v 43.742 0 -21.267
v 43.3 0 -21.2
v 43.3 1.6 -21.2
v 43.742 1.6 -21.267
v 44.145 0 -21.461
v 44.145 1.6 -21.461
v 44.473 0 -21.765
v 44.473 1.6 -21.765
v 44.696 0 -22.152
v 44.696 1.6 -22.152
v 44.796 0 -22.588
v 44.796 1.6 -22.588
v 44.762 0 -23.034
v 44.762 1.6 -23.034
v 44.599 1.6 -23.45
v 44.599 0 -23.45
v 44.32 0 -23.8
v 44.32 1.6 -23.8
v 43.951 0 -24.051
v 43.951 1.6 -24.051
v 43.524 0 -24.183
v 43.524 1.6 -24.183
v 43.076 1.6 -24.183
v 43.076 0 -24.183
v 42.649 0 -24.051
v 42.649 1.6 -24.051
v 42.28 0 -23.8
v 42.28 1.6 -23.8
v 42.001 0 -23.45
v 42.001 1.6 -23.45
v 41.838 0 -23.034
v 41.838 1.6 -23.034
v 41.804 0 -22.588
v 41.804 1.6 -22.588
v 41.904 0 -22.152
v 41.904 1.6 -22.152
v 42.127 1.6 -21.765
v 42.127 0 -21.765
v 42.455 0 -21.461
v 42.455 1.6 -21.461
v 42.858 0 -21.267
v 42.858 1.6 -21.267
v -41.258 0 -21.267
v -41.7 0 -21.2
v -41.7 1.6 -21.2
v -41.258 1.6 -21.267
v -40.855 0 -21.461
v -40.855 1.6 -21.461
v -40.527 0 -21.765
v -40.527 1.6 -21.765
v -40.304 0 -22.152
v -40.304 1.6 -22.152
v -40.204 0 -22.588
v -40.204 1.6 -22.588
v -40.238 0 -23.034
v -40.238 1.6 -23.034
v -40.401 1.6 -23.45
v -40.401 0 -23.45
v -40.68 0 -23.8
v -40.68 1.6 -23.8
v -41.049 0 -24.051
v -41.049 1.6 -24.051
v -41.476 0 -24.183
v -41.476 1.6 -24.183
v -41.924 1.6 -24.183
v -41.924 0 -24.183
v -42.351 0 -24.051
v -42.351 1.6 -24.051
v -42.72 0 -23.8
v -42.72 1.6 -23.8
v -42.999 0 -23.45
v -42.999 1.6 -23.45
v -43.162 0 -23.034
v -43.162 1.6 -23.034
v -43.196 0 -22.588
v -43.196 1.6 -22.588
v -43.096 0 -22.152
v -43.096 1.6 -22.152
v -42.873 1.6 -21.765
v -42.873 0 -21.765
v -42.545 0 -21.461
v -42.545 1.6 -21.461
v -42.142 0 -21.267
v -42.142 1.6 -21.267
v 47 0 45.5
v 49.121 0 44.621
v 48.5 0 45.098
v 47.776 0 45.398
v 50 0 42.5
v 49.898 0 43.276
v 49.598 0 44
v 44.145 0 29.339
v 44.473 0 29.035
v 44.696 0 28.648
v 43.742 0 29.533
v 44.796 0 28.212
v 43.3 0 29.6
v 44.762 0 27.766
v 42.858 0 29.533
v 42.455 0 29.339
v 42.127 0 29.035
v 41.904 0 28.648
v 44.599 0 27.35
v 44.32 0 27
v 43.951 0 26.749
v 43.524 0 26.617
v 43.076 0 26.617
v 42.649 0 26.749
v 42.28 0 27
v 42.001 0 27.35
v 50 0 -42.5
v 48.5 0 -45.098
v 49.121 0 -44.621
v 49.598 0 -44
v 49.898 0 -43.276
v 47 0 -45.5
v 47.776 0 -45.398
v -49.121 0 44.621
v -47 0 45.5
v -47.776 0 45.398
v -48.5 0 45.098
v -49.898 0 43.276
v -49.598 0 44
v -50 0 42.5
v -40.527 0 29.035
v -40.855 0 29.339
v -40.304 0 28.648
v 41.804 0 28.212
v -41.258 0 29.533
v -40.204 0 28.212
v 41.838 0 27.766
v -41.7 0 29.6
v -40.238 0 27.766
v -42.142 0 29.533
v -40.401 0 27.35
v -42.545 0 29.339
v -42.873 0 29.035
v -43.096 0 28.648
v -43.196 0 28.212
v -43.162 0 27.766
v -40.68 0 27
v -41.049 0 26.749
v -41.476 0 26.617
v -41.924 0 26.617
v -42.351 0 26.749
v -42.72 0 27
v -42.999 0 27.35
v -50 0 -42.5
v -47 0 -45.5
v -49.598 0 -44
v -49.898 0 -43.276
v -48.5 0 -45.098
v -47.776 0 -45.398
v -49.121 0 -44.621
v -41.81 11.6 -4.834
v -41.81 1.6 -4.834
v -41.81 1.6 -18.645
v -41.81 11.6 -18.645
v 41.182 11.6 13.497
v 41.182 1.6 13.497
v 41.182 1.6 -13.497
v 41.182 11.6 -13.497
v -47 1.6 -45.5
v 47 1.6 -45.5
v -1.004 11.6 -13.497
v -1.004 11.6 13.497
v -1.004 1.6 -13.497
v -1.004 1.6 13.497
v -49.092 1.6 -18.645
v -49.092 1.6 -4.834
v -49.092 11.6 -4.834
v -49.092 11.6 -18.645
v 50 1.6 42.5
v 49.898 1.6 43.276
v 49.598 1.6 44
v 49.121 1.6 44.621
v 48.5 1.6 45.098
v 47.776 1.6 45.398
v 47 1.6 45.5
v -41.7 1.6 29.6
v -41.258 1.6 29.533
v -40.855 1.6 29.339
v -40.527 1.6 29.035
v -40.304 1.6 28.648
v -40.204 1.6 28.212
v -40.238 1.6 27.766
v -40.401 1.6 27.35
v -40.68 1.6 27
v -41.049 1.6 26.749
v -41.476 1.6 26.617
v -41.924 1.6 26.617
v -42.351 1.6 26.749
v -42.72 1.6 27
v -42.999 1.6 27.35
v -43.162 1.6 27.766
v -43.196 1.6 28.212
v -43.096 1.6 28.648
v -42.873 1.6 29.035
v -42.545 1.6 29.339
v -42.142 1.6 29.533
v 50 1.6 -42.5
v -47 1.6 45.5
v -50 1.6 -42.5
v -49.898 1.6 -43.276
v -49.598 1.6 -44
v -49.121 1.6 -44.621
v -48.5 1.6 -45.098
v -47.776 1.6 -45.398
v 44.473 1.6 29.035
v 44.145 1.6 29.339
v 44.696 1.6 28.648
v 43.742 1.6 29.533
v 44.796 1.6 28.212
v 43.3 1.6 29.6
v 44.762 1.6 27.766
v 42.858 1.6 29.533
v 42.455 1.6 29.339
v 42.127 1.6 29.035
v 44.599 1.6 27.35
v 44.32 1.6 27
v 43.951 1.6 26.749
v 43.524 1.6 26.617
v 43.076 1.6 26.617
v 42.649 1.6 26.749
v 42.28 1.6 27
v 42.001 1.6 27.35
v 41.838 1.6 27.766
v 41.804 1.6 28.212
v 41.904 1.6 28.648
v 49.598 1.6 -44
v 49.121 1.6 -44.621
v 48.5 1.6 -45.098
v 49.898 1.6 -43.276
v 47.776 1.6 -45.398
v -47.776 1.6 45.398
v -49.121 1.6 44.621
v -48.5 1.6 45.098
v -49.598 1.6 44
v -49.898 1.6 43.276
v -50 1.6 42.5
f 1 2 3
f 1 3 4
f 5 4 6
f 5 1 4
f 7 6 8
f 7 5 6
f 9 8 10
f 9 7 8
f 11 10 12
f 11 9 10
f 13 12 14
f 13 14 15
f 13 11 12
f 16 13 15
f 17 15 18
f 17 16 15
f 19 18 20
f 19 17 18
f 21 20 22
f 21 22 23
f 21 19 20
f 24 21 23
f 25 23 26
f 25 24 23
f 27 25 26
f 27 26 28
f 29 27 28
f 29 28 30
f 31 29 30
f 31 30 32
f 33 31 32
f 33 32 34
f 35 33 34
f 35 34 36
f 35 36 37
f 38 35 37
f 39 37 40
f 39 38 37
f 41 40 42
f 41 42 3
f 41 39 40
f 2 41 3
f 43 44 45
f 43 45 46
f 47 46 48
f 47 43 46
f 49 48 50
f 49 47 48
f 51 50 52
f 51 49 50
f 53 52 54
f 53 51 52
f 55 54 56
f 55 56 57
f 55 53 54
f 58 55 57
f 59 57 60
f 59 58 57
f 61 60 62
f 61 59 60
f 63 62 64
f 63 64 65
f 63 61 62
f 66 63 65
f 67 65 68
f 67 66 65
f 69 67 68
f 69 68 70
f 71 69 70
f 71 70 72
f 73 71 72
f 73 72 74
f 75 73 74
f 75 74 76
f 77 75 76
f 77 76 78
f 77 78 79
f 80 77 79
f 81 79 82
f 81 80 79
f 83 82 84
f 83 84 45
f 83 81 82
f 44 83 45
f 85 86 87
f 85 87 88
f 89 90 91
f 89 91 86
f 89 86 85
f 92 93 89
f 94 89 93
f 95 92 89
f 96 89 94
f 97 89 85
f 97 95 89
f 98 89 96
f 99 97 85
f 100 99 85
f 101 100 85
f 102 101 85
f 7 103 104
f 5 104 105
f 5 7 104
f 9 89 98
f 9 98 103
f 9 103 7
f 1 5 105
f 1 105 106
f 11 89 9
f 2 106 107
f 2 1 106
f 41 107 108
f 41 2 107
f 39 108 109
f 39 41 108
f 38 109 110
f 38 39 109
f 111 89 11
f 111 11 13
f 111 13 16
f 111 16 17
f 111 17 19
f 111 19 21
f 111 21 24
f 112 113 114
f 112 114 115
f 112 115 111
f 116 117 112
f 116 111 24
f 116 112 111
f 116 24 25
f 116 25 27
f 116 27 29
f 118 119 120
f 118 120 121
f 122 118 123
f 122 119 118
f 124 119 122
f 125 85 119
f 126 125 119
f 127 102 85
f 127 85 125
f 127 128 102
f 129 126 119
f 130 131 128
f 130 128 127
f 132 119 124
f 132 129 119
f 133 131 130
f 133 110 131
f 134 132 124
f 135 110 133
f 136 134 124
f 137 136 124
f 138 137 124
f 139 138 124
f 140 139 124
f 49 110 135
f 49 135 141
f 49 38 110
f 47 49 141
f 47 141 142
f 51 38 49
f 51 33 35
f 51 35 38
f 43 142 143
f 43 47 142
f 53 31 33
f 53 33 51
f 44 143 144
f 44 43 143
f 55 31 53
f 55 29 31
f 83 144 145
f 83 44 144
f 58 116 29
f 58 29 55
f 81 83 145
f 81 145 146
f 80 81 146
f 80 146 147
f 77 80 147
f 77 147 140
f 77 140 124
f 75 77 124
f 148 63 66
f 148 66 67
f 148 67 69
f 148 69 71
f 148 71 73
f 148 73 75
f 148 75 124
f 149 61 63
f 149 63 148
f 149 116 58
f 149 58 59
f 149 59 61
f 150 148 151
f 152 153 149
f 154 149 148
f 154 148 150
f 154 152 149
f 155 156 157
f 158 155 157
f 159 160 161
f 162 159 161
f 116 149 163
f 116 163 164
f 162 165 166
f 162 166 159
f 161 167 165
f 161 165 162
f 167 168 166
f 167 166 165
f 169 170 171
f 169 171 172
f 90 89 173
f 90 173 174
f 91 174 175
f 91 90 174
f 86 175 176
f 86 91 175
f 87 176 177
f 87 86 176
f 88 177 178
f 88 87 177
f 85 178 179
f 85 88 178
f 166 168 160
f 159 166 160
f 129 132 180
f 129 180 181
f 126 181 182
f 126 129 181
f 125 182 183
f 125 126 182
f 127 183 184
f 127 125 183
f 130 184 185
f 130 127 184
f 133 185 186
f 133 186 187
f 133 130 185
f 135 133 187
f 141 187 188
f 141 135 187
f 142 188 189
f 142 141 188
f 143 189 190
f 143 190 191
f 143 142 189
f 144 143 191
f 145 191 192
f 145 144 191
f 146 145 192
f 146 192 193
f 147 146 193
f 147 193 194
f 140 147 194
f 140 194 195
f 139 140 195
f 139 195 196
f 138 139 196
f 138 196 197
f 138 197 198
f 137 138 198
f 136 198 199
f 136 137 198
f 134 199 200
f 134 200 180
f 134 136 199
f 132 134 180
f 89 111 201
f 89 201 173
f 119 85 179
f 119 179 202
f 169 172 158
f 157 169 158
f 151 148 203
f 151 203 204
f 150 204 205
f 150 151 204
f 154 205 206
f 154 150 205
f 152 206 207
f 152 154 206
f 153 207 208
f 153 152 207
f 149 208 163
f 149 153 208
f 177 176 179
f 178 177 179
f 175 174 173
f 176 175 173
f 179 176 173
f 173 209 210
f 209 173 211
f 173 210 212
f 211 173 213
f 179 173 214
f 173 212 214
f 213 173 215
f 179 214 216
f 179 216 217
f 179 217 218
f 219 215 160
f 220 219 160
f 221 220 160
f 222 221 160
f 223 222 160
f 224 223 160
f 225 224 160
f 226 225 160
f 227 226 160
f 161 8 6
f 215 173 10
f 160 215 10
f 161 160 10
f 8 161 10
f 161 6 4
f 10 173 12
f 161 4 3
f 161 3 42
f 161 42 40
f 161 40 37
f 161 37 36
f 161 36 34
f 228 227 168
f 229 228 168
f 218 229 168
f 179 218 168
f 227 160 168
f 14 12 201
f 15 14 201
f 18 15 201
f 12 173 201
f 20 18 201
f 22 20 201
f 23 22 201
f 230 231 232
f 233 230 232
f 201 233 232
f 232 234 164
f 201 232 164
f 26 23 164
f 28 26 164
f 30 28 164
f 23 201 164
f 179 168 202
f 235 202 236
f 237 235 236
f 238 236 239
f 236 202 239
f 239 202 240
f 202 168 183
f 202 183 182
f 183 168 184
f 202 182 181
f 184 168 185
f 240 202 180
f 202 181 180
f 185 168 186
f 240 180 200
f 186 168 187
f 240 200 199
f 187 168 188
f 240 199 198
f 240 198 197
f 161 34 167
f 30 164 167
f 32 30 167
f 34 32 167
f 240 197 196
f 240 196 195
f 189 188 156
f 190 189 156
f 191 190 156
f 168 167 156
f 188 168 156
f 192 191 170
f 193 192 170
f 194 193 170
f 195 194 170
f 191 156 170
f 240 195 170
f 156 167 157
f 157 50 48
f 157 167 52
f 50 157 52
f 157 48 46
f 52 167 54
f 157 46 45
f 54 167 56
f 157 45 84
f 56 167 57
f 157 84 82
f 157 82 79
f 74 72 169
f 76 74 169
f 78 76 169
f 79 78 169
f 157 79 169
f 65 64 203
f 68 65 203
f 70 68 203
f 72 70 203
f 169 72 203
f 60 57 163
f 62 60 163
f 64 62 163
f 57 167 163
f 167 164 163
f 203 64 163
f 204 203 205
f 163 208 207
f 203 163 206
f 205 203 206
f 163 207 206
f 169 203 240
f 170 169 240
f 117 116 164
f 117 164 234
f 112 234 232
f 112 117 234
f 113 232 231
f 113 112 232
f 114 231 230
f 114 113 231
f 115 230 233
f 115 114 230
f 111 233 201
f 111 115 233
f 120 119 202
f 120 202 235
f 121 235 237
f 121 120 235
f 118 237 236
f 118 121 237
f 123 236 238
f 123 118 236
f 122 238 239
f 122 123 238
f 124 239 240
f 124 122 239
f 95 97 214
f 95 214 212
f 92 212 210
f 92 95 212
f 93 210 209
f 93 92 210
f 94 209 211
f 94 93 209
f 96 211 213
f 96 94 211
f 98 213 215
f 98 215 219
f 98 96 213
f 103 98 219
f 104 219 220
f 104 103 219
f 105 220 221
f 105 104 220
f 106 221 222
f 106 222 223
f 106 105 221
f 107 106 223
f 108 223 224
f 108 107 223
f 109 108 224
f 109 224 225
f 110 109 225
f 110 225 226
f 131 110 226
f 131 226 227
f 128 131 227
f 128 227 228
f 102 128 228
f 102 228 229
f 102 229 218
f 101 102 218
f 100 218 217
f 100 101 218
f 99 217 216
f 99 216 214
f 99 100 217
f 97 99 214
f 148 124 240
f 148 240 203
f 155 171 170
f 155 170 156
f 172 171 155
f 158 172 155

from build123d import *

# Parameters (mm, degrees)
SKETCH_1_R      = 1.5
EXTRUDE_1_DEPTH = 1.6
SKETCH_2_W      = 42.186521795
SKETCH_2_H      = 26.994351744
SKETCH_2_W_2    = 7.282197215
SKETCH_2_H_2    = 13.811063683
EXTRUDE_2_DEPTH = 10


with BuildPart() as part:
    # 草图1 → 凸台-拉伸1 (new body)
    with BuildSketch(Plane(origin=(0, 0, 0), x_dir=(1, 0, 0), z_dir=(0, 1, 0))):
        with BuildLine():
            Line((-47, 45.5), (47, 45.5))
            ThreePointArc((47, 45.5), (49.121320344, 44.621320344), (50, 42.5))
            Line((50, 42.5), (50, -42.5))
            ThreePointArc((50, -42.5), (49.121320344, -44.621320344), (47, -45.5))
            Line((47, -45.5), (-47, -45.5))
            ThreePointArc((-47, -45.5), (-49.121320344, -44.621320344), (-50, -42.5))
            Line((-50, -42.5), (-50, 42.5))
            ThreePointArc((-50, 42.5), (-49.121320344, 44.621320344), (-47, 45.5))
        make_face()
        with Locations(Location((-41.7, 22.7, 0), (0, 0, 270))):
            Circle(SKETCH_1_R, mode=Mode.SUBTRACT)
        with Locations(Location((43.3, 22.7, 0), (0, 0, 270))):
            Circle(SKETCH_1_R, mode=Mode.SUBTRACT)
        with Locations(Location((43.3, -28.1, 0), (0, 0, 270))):
            Circle(SKETCH_1_R, mode=Mode.SUBTRACT)
        with Locations(Location((-41.7, -28.1, 0), (0, 0, 270))):
            Circle(SKETCH_1_R, mode=Mode.SUBTRACT)
    extrude(amount=EXTRUDE_1_DEPTH)

    # 草图2 → 凸台-拉伸2 (add)
    with BuildSketch(Plane(origin=(0, 1.6, 0), x_dir=(1, 0, 0), z_dir=(0, 1, 0))):
        with Locations((20.088819902, 0)):
            Rectangle(SKETCH_2_W, SKETCH_2_H)
        with Locations((-45.45095503, 11.739404131)):
            Rectangle(SKETCH_2_W_2, SKETCH_2_H_2)
    extrude(amount=EXTRUDE_2_DEPTH)


solid = part.part
